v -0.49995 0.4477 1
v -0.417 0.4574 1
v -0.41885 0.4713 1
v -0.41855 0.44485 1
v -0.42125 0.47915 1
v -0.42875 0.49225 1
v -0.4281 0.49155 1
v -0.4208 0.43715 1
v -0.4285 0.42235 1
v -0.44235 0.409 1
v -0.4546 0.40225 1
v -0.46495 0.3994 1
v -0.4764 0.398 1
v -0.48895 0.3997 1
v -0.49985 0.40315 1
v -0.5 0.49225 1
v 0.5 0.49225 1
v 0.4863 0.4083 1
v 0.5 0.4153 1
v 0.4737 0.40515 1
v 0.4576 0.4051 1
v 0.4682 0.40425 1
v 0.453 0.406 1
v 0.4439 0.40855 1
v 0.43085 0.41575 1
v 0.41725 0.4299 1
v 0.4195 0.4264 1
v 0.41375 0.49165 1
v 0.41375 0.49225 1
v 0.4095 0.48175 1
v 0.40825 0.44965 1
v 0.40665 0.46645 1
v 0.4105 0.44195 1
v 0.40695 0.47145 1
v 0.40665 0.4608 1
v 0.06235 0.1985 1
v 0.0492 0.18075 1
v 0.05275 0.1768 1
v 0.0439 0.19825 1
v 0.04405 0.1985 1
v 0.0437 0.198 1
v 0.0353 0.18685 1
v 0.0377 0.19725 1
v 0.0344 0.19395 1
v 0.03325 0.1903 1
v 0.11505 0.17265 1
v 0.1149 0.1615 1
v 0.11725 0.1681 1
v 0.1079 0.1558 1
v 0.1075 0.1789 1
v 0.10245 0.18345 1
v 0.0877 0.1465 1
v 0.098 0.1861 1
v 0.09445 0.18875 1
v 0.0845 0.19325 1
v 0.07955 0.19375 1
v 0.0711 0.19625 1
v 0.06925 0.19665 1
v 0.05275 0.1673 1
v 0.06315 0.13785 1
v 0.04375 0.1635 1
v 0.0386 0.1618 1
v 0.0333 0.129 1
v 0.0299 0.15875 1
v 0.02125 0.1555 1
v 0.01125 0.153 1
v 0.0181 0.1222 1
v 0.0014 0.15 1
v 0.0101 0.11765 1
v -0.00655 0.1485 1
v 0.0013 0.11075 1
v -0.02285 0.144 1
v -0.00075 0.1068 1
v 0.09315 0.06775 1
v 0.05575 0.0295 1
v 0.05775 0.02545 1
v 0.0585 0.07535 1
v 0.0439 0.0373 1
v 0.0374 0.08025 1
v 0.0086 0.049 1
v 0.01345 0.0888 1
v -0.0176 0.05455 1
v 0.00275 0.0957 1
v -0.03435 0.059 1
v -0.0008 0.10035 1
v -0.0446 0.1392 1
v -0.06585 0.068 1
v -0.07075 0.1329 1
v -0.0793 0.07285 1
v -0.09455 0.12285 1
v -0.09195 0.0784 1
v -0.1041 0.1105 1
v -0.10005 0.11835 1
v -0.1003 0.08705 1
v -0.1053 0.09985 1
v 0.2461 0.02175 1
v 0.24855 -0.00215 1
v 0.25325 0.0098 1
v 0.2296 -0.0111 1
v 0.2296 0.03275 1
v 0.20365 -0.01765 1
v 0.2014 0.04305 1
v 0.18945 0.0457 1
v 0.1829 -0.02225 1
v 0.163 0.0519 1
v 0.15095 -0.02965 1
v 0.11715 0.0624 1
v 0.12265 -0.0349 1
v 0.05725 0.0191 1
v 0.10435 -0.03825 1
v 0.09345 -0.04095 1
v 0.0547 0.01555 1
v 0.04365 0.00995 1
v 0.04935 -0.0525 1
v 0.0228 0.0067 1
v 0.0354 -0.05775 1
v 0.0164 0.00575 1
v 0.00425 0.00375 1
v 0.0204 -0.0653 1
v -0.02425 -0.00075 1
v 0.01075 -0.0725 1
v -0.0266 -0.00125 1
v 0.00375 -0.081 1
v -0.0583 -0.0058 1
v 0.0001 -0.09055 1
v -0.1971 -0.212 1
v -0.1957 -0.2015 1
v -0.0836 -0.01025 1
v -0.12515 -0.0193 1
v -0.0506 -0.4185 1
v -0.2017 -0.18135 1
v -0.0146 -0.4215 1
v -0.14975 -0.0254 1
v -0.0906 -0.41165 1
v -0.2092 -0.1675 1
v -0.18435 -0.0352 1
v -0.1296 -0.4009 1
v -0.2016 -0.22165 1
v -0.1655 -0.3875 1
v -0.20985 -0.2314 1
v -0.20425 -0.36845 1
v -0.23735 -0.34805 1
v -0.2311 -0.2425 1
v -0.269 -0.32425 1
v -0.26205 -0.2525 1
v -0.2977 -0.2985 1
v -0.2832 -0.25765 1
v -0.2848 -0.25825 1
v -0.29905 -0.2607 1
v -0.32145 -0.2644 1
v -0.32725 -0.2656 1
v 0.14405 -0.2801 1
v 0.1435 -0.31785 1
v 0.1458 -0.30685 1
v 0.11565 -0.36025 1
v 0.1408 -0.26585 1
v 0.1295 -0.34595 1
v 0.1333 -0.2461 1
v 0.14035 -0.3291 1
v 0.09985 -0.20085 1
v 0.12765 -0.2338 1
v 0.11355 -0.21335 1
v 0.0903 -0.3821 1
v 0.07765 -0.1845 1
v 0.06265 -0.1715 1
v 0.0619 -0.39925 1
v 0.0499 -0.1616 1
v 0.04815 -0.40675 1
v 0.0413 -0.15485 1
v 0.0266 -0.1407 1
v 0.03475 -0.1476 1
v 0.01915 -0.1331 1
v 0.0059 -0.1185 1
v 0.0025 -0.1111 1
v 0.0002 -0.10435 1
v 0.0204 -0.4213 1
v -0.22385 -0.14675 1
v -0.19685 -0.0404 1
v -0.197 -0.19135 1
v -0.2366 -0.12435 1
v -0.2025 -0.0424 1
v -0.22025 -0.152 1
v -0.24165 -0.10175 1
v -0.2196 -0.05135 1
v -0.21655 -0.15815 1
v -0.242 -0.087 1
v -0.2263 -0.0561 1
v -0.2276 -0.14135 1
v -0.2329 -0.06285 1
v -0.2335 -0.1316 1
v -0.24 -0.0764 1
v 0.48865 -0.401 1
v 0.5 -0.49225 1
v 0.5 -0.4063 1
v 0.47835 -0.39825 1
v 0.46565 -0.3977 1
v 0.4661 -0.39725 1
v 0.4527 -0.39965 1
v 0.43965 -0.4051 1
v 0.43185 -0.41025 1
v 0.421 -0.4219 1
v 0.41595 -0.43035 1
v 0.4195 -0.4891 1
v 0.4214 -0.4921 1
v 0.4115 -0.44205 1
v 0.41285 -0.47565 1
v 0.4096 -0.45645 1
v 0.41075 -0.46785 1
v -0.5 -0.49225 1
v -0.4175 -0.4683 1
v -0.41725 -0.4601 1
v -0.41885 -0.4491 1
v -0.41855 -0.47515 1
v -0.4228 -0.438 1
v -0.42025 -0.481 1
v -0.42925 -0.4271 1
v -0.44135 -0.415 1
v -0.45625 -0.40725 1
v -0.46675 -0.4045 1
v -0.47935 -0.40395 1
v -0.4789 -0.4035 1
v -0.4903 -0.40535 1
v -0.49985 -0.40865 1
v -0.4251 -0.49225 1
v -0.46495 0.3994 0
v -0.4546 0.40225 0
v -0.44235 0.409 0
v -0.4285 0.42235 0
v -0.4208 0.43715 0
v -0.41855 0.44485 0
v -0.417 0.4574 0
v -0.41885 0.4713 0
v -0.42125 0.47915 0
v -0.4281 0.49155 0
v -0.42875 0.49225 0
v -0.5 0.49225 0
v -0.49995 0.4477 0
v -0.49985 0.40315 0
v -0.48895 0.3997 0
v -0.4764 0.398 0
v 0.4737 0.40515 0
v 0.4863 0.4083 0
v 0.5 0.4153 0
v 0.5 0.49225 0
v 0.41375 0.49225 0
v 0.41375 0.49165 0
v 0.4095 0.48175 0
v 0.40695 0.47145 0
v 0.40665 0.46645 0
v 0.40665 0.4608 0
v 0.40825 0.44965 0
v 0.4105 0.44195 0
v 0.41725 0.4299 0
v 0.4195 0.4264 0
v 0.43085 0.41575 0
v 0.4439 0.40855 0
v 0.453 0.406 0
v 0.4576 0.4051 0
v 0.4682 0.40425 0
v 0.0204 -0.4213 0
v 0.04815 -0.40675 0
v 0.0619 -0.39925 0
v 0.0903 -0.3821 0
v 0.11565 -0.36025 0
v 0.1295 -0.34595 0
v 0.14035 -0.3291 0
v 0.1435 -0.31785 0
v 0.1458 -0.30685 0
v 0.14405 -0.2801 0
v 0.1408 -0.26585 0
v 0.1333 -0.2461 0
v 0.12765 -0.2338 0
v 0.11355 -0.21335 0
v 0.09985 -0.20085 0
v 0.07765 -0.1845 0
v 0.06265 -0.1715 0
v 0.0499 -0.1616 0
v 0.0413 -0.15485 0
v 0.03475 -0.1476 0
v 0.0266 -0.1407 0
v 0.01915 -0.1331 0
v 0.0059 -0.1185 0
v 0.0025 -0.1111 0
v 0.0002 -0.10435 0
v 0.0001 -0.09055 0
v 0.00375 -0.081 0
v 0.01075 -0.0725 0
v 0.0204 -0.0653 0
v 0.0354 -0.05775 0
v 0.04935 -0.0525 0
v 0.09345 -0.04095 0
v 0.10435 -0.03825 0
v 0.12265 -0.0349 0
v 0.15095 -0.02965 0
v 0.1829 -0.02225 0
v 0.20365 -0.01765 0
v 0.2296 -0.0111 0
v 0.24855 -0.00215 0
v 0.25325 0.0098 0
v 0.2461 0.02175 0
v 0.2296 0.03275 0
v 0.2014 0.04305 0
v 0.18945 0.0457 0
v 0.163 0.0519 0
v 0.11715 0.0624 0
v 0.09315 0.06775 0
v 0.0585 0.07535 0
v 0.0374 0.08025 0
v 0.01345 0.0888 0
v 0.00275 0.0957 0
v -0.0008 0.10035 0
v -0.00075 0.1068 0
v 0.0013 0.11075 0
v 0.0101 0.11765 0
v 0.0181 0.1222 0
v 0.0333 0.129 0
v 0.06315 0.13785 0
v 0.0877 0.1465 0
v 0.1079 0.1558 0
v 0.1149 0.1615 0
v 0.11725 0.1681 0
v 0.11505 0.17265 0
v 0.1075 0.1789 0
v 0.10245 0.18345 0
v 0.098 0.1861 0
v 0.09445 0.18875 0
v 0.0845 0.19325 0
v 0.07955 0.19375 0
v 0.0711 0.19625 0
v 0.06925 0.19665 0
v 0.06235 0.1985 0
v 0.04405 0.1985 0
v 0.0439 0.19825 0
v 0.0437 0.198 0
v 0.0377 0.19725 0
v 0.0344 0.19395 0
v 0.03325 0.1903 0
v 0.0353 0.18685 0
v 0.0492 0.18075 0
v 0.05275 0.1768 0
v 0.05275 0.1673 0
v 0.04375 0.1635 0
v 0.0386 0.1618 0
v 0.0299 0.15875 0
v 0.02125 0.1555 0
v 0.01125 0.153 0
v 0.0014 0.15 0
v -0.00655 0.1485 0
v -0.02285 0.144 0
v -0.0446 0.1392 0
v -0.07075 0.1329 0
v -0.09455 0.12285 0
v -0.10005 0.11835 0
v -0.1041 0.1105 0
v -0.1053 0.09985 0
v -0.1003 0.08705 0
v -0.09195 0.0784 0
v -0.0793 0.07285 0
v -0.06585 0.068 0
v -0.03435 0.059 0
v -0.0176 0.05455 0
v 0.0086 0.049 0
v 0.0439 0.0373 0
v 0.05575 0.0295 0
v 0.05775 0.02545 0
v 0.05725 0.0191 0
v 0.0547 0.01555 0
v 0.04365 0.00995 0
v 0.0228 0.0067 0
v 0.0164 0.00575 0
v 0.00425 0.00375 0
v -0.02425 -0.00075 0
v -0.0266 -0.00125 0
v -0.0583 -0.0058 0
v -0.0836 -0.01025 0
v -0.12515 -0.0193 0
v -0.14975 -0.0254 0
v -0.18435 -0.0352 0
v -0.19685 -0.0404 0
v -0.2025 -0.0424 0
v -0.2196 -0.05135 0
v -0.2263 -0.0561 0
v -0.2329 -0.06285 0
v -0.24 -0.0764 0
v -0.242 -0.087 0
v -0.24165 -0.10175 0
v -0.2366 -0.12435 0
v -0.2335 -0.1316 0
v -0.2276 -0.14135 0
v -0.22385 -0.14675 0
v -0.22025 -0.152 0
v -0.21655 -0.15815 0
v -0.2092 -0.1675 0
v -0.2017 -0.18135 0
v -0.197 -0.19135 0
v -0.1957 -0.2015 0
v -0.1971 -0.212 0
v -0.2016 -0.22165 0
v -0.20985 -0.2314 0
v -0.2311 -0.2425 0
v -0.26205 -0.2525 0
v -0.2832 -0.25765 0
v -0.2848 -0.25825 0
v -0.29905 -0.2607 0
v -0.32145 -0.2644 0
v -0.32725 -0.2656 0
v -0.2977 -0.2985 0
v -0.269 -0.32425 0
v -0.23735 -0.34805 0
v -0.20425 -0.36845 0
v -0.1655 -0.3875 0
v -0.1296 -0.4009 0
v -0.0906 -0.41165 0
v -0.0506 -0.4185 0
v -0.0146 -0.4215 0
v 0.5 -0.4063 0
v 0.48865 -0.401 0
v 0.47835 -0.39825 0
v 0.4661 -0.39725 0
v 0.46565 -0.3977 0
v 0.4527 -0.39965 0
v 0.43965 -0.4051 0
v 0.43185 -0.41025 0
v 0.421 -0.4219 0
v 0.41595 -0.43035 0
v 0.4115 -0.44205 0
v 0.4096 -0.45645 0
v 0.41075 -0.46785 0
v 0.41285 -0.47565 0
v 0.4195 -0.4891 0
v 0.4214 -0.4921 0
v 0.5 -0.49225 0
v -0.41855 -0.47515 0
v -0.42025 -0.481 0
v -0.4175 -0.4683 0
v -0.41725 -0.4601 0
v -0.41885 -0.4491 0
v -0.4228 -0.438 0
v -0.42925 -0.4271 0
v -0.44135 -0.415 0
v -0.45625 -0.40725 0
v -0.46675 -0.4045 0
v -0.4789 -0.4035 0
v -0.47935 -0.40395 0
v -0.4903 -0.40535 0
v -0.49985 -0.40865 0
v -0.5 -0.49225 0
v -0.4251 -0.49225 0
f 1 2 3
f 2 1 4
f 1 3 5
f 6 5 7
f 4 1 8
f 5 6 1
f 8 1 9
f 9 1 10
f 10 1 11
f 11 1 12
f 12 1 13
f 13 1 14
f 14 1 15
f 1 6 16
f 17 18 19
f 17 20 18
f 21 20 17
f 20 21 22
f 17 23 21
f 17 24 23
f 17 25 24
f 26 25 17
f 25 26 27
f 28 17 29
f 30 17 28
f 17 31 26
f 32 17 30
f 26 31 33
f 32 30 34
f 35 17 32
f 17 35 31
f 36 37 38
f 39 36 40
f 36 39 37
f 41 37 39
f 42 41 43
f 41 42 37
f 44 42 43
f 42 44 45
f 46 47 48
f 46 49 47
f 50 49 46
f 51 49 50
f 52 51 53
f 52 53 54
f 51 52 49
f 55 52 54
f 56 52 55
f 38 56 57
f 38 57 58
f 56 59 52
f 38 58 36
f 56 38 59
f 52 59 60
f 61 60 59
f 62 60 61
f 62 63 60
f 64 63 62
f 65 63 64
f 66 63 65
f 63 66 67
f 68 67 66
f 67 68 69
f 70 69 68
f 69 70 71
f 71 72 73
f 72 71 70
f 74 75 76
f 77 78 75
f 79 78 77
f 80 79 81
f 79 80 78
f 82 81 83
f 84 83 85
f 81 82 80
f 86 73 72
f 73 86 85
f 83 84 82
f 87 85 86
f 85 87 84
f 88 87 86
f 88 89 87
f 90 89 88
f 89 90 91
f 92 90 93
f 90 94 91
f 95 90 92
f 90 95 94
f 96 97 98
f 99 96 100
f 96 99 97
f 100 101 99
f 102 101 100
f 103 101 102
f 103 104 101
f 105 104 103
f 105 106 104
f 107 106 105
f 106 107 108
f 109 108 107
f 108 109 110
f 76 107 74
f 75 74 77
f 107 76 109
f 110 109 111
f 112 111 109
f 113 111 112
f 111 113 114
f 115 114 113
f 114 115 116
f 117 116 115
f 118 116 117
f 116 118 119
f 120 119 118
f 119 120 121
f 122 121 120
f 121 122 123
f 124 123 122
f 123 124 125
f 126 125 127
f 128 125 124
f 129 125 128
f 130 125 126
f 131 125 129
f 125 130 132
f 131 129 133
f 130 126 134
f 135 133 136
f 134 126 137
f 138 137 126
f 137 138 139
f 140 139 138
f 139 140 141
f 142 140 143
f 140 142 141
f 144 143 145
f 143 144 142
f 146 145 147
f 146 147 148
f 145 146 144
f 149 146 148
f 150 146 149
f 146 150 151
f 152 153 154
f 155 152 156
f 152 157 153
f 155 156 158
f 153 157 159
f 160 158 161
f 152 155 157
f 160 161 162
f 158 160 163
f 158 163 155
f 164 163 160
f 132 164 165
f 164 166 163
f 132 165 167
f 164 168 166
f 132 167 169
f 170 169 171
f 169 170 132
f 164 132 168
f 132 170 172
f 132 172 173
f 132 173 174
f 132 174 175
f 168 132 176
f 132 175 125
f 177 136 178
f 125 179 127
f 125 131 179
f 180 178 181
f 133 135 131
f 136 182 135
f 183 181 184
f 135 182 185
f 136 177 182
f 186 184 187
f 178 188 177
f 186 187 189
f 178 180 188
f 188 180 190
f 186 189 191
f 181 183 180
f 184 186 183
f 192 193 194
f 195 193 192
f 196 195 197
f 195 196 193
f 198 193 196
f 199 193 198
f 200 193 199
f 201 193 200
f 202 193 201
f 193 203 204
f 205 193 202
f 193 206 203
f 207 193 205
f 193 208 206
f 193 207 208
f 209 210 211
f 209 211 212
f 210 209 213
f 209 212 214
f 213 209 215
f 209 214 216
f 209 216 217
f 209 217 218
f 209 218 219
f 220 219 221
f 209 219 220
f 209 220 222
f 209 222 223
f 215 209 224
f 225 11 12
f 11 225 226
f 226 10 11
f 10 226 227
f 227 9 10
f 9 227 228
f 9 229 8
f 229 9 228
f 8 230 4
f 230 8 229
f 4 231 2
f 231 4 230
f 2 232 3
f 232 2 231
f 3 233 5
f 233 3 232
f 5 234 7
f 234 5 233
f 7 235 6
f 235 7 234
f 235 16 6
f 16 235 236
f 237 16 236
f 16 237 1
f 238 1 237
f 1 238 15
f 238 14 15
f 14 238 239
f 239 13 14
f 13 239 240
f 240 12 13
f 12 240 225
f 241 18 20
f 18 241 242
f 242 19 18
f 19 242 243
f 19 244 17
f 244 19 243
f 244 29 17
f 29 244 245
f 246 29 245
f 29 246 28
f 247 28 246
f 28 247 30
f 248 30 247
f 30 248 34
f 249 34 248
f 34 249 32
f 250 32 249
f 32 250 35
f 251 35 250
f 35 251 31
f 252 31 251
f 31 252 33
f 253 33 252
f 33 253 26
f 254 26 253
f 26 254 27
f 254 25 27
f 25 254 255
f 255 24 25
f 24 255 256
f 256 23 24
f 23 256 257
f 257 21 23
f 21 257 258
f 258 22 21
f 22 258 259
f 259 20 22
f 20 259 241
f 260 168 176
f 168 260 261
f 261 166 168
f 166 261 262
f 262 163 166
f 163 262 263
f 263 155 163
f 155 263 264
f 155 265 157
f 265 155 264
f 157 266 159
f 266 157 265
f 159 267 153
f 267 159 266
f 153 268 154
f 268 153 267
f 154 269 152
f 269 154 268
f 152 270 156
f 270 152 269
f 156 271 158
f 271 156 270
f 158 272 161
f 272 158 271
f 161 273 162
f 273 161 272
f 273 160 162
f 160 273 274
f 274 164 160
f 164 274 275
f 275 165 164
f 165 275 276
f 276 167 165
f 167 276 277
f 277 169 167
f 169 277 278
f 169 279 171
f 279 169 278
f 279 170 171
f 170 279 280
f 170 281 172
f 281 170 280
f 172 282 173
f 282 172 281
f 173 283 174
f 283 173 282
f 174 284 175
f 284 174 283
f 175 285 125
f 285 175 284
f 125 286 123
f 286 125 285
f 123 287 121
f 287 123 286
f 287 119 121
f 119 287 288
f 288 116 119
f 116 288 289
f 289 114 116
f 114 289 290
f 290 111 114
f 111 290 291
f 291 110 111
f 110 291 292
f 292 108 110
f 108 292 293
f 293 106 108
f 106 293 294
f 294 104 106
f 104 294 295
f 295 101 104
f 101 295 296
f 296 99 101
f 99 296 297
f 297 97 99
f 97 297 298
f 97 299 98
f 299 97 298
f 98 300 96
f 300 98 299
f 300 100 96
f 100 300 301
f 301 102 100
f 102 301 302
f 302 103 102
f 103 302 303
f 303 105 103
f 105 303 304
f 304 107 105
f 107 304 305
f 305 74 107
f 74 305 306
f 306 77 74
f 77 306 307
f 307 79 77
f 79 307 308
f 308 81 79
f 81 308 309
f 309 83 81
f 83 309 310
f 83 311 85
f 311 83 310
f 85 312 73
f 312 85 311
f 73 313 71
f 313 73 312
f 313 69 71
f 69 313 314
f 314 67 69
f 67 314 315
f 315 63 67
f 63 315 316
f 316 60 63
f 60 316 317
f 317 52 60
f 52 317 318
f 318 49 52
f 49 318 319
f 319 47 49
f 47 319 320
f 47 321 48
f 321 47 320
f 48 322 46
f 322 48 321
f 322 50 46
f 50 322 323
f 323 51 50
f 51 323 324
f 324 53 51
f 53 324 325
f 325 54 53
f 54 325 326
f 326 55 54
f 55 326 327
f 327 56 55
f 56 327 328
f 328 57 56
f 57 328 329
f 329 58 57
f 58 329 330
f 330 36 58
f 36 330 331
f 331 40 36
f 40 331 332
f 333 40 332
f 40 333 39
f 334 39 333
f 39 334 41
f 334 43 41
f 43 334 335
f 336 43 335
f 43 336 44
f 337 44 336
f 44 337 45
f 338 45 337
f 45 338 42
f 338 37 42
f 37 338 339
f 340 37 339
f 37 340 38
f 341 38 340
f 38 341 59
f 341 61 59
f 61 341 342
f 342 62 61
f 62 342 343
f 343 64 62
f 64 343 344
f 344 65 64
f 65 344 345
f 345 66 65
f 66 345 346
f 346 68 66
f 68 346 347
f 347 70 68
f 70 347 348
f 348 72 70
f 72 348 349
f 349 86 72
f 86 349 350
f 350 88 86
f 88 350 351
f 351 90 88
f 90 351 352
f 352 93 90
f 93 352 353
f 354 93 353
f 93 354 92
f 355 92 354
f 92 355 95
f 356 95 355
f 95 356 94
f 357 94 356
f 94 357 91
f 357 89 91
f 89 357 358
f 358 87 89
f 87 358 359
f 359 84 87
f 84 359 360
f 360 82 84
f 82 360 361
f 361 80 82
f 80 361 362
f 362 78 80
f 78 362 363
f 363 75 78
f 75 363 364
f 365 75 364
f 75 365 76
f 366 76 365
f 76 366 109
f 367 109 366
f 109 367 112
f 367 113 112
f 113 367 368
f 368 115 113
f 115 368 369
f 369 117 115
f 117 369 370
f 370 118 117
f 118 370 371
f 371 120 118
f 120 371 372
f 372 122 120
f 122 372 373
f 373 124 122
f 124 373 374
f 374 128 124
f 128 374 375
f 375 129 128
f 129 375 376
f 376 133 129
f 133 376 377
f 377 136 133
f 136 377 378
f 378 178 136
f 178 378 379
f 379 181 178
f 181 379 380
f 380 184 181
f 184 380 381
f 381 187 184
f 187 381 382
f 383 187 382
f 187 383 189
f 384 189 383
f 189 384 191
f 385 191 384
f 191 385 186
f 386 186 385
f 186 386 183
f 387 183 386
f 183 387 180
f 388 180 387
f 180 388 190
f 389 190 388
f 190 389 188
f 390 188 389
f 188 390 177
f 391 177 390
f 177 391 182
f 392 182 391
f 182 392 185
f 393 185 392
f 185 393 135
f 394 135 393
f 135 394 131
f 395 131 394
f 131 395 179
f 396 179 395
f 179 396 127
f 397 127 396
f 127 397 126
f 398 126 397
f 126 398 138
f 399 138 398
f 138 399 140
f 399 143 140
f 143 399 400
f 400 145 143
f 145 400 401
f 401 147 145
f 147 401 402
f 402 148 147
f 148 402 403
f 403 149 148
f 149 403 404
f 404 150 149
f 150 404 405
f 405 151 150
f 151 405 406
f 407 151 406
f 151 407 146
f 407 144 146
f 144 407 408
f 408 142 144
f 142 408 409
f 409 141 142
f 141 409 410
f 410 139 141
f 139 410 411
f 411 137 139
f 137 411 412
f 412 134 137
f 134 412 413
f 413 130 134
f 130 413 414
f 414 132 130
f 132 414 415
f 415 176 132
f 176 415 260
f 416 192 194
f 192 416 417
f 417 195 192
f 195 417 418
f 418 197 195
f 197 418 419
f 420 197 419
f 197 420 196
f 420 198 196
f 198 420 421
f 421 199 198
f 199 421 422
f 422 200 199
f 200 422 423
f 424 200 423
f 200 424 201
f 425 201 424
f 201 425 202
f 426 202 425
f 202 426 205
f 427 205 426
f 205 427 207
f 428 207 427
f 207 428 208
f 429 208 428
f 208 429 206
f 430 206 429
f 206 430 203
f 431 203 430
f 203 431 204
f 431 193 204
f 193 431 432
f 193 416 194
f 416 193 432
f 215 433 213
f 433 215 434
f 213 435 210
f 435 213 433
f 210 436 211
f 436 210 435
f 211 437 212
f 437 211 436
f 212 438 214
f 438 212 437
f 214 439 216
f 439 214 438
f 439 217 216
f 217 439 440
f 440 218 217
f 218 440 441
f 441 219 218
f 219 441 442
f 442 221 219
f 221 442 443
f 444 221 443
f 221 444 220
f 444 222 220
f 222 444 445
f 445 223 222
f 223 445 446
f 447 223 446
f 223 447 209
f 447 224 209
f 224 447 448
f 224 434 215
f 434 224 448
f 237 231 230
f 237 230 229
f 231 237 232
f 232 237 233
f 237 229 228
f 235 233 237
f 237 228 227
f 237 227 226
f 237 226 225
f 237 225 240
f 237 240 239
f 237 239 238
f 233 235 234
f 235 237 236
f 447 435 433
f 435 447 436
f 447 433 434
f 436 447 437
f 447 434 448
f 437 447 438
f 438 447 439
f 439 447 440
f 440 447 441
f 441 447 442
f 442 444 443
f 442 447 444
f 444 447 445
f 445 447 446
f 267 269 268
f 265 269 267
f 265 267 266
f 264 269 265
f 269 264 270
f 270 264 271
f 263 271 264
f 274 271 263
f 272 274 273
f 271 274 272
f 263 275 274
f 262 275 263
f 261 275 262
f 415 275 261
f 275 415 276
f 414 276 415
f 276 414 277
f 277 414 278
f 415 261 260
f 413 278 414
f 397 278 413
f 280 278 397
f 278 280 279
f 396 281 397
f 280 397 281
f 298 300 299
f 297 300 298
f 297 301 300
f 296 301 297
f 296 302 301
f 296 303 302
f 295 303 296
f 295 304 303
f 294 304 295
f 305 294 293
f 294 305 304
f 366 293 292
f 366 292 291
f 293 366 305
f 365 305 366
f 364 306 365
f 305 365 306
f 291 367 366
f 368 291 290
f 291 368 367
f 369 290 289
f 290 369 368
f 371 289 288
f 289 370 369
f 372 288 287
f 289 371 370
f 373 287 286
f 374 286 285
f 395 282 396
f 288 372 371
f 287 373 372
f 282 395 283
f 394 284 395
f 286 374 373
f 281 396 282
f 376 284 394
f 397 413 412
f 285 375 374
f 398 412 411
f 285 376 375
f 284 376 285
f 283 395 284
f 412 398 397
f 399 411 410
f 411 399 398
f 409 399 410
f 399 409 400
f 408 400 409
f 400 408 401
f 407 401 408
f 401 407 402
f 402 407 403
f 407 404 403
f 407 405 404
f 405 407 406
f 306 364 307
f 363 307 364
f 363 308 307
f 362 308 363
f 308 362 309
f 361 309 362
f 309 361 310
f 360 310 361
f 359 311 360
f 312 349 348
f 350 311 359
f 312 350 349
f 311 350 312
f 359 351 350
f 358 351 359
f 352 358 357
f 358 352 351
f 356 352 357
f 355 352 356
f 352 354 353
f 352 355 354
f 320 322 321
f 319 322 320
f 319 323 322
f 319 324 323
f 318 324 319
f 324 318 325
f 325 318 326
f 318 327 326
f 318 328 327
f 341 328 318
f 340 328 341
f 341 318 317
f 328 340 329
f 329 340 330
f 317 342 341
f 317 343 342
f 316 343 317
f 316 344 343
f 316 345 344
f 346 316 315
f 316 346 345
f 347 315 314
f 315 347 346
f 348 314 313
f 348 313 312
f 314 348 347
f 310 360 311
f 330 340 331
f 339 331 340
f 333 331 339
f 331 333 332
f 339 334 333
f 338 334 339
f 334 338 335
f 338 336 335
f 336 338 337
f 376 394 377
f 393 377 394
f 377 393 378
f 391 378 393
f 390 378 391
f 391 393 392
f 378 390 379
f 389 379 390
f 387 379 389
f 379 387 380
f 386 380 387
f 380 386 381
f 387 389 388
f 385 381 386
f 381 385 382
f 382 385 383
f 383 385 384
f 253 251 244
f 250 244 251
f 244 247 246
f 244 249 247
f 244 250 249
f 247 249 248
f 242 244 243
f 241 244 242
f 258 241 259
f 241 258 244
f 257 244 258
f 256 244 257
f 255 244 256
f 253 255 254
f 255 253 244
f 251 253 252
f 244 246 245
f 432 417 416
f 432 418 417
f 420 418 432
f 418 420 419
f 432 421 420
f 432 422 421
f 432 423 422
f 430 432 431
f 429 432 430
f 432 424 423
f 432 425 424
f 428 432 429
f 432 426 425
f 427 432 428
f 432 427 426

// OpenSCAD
module C2purple2_1()
{
 /* Generated by trace2scad version 20150415
    http://aggregate.org/MAKE/TRACE2SCAD/
    Optimized model has 227/2747 original points
 */
 color([0.5, 0.5, 0.5])
 assign(minx=0) /* polygon minx=0 */
 assign(miny=0) /* polygon miny=0 */
 assign(maxx=20000) /* polygon maxx=20000 */
 assign(maxy=19690) /* polygon maxy=19690 */
 assign(dx=maxx-minx)
 assign(dy=maxy-miny)
 assign(maxd=((dx>dy)?dx:dy))
 scale([1/maxd, 1/maxd, 1])
 translate([-minx-dx/2, -miny-dy/2, 0])
 linear_extrude(height=1, convexity=227)
 union() {
  union() {
   polygon([[1,18799],[3,17908],[221,17839],[472,17805],[701,17833],[908,17890],[1153,18025],[1430,18292],[1584,18588],[1629,18742],[1660,18993],[1623,19271],[1575,19428],[1438,19676],[1425,19690],[0,19690]], convexity=5);
   polygon([[18275,19684],[18275,19678],[18190,19480],[18139,19274],[18133,19174],[18133,19061],[18165,18838],[18210,18684],[18345,18443],[18390,18373],[18617,18160],[18878,18016],[19060,17965],[19152,17947],[19364,17930],[19474,17948],[19726,18011],[20000,18151],[20000,19690],[18275,19690]], convexity=7);
   polygon([[10878,13810],[10874,13805],[10754,13790],[10688,13724],[10665,13651],[10706,13582],[10984,13460],[11055,13381],[11055,13191],[10875,13115],[10772,13081],[10598,13020],[10425,12955],[10225,12905],[10028,12845],[9869,12815],[9543,12725],[9108,12629],[8585,12503],[8109,12302],[7999,12212],[7918,12055],[7894,11842],[7994,11586],[8161,11413],[8414,11302],[8683,11205],[9313,11025],[9648,10936],[10172,10825],[10878,10591],[11115,10435],[11155,10354],[11145,10227],[11094,10156],[10873,10044],[10456,9979],[10328,9960],[10085,9920],[9515,9830],[9468,9820],[8834,9729],[8328,9640],[7497,9459],[7005,9337],[6313,9141],[6063,9037],[5950,8997],[5608,8818],[5474,8723],[5342,8588],[5200,8317],[5160,8105],[5167,7810],[5268,7358],[5330,7213],[5448,7018],[5523,6910],[5595,6805],[5669,6682],[5816,6495],[5966,6218],[6060,6018],[6086,5815],[6058,5605],[5968,5412],[5803,5217],[5378,4995],[4759,4795],[4336,4692],[4304,4680],[4019,4631],[3571,4557],[3455,4533],[4046,3875],[4620,3360],[5253,2884],[5915,2476],[6690,2095],[7408,1827],[8188,1612],[8988,1475],[9708,1415],[10408,1419],[10963,1710],[11238,1860],[11806,2203],[12313,2640],[12590,2926],[12807,3263],[12870,3488],[12916,3708],[12881,4243],[12816,4528],[12666,4923],[12553,5169],[12271,5578],[11997,5828],[11553,6155],[11253,6415],[10998,6613],[10826,6748],[10695,6893],[10532,7031],[10383,7183],[10118,7475],[10050,7623],[10004,7758],[10002,8034],[10075,8225],[10215,8395],[10408,8539],[10708,8690],[10987,8795],[11869,9026],[12087,9080],[12453,9147],[13019,9252],[13658,9400],[14073,9492],[14592,9623],[14971,9802],[15065,10041],[14922,10280],[14592,10500],[14028,10706],[13789,10759],[13260,10883],[12343,11093],[11863,11200],[11170,11352],[10748,11450],[10269,11621],[10055,11759],[9984,11852],[9985,11981],[10026,12060],[10202,12198],[10362,12289],[10666,12425],[11263,12602],[11754,12775],[12158,12961],[12298,13075],[12345,13207],[12301,13298],[12150,13423],[12049,13514],[11960,13567],[11889,13620],[11690,13710],[11591,13720],[11422,13770],[11385,13778],[11247,13815],[10881,13815]], convexity=16);
   polygon([[19317,1895],[19313,1891],[19054,1852],[18793,1743],[18637,1640],[18420,1407],[18319,1238],[18230,1004],[18192,716],[18215,488],[18257,332],[18390,63],[18428,3],[20000,0],[20000,1719],[19773,1825],[19567,1880],[19322,1900]], convexity=6);
   polygon([[417,1770],[413,1766],[194,1738],[3,1672],[0,0],[1498,0],[1595,225],[1629,342],[1650,479],[1655,643],[1623,863],[1544,1085],[1415,1303],[1173,1545],[875,1700],[665,1755],[422,1775]], convexity=5);
  }
 }
}

module C2purple2()
{
 /* all layers combined, scaled to within a 1mm cube */
 scale([1, 1, 1/1])
 difference() {
  union() {
   scale([1,1,2]) translate([0,0,-0.5]) C2purple2_1();
  }
  translate([0,0,-2]) cube([2,2,4],center=true);
 }
}
C2purple2();
